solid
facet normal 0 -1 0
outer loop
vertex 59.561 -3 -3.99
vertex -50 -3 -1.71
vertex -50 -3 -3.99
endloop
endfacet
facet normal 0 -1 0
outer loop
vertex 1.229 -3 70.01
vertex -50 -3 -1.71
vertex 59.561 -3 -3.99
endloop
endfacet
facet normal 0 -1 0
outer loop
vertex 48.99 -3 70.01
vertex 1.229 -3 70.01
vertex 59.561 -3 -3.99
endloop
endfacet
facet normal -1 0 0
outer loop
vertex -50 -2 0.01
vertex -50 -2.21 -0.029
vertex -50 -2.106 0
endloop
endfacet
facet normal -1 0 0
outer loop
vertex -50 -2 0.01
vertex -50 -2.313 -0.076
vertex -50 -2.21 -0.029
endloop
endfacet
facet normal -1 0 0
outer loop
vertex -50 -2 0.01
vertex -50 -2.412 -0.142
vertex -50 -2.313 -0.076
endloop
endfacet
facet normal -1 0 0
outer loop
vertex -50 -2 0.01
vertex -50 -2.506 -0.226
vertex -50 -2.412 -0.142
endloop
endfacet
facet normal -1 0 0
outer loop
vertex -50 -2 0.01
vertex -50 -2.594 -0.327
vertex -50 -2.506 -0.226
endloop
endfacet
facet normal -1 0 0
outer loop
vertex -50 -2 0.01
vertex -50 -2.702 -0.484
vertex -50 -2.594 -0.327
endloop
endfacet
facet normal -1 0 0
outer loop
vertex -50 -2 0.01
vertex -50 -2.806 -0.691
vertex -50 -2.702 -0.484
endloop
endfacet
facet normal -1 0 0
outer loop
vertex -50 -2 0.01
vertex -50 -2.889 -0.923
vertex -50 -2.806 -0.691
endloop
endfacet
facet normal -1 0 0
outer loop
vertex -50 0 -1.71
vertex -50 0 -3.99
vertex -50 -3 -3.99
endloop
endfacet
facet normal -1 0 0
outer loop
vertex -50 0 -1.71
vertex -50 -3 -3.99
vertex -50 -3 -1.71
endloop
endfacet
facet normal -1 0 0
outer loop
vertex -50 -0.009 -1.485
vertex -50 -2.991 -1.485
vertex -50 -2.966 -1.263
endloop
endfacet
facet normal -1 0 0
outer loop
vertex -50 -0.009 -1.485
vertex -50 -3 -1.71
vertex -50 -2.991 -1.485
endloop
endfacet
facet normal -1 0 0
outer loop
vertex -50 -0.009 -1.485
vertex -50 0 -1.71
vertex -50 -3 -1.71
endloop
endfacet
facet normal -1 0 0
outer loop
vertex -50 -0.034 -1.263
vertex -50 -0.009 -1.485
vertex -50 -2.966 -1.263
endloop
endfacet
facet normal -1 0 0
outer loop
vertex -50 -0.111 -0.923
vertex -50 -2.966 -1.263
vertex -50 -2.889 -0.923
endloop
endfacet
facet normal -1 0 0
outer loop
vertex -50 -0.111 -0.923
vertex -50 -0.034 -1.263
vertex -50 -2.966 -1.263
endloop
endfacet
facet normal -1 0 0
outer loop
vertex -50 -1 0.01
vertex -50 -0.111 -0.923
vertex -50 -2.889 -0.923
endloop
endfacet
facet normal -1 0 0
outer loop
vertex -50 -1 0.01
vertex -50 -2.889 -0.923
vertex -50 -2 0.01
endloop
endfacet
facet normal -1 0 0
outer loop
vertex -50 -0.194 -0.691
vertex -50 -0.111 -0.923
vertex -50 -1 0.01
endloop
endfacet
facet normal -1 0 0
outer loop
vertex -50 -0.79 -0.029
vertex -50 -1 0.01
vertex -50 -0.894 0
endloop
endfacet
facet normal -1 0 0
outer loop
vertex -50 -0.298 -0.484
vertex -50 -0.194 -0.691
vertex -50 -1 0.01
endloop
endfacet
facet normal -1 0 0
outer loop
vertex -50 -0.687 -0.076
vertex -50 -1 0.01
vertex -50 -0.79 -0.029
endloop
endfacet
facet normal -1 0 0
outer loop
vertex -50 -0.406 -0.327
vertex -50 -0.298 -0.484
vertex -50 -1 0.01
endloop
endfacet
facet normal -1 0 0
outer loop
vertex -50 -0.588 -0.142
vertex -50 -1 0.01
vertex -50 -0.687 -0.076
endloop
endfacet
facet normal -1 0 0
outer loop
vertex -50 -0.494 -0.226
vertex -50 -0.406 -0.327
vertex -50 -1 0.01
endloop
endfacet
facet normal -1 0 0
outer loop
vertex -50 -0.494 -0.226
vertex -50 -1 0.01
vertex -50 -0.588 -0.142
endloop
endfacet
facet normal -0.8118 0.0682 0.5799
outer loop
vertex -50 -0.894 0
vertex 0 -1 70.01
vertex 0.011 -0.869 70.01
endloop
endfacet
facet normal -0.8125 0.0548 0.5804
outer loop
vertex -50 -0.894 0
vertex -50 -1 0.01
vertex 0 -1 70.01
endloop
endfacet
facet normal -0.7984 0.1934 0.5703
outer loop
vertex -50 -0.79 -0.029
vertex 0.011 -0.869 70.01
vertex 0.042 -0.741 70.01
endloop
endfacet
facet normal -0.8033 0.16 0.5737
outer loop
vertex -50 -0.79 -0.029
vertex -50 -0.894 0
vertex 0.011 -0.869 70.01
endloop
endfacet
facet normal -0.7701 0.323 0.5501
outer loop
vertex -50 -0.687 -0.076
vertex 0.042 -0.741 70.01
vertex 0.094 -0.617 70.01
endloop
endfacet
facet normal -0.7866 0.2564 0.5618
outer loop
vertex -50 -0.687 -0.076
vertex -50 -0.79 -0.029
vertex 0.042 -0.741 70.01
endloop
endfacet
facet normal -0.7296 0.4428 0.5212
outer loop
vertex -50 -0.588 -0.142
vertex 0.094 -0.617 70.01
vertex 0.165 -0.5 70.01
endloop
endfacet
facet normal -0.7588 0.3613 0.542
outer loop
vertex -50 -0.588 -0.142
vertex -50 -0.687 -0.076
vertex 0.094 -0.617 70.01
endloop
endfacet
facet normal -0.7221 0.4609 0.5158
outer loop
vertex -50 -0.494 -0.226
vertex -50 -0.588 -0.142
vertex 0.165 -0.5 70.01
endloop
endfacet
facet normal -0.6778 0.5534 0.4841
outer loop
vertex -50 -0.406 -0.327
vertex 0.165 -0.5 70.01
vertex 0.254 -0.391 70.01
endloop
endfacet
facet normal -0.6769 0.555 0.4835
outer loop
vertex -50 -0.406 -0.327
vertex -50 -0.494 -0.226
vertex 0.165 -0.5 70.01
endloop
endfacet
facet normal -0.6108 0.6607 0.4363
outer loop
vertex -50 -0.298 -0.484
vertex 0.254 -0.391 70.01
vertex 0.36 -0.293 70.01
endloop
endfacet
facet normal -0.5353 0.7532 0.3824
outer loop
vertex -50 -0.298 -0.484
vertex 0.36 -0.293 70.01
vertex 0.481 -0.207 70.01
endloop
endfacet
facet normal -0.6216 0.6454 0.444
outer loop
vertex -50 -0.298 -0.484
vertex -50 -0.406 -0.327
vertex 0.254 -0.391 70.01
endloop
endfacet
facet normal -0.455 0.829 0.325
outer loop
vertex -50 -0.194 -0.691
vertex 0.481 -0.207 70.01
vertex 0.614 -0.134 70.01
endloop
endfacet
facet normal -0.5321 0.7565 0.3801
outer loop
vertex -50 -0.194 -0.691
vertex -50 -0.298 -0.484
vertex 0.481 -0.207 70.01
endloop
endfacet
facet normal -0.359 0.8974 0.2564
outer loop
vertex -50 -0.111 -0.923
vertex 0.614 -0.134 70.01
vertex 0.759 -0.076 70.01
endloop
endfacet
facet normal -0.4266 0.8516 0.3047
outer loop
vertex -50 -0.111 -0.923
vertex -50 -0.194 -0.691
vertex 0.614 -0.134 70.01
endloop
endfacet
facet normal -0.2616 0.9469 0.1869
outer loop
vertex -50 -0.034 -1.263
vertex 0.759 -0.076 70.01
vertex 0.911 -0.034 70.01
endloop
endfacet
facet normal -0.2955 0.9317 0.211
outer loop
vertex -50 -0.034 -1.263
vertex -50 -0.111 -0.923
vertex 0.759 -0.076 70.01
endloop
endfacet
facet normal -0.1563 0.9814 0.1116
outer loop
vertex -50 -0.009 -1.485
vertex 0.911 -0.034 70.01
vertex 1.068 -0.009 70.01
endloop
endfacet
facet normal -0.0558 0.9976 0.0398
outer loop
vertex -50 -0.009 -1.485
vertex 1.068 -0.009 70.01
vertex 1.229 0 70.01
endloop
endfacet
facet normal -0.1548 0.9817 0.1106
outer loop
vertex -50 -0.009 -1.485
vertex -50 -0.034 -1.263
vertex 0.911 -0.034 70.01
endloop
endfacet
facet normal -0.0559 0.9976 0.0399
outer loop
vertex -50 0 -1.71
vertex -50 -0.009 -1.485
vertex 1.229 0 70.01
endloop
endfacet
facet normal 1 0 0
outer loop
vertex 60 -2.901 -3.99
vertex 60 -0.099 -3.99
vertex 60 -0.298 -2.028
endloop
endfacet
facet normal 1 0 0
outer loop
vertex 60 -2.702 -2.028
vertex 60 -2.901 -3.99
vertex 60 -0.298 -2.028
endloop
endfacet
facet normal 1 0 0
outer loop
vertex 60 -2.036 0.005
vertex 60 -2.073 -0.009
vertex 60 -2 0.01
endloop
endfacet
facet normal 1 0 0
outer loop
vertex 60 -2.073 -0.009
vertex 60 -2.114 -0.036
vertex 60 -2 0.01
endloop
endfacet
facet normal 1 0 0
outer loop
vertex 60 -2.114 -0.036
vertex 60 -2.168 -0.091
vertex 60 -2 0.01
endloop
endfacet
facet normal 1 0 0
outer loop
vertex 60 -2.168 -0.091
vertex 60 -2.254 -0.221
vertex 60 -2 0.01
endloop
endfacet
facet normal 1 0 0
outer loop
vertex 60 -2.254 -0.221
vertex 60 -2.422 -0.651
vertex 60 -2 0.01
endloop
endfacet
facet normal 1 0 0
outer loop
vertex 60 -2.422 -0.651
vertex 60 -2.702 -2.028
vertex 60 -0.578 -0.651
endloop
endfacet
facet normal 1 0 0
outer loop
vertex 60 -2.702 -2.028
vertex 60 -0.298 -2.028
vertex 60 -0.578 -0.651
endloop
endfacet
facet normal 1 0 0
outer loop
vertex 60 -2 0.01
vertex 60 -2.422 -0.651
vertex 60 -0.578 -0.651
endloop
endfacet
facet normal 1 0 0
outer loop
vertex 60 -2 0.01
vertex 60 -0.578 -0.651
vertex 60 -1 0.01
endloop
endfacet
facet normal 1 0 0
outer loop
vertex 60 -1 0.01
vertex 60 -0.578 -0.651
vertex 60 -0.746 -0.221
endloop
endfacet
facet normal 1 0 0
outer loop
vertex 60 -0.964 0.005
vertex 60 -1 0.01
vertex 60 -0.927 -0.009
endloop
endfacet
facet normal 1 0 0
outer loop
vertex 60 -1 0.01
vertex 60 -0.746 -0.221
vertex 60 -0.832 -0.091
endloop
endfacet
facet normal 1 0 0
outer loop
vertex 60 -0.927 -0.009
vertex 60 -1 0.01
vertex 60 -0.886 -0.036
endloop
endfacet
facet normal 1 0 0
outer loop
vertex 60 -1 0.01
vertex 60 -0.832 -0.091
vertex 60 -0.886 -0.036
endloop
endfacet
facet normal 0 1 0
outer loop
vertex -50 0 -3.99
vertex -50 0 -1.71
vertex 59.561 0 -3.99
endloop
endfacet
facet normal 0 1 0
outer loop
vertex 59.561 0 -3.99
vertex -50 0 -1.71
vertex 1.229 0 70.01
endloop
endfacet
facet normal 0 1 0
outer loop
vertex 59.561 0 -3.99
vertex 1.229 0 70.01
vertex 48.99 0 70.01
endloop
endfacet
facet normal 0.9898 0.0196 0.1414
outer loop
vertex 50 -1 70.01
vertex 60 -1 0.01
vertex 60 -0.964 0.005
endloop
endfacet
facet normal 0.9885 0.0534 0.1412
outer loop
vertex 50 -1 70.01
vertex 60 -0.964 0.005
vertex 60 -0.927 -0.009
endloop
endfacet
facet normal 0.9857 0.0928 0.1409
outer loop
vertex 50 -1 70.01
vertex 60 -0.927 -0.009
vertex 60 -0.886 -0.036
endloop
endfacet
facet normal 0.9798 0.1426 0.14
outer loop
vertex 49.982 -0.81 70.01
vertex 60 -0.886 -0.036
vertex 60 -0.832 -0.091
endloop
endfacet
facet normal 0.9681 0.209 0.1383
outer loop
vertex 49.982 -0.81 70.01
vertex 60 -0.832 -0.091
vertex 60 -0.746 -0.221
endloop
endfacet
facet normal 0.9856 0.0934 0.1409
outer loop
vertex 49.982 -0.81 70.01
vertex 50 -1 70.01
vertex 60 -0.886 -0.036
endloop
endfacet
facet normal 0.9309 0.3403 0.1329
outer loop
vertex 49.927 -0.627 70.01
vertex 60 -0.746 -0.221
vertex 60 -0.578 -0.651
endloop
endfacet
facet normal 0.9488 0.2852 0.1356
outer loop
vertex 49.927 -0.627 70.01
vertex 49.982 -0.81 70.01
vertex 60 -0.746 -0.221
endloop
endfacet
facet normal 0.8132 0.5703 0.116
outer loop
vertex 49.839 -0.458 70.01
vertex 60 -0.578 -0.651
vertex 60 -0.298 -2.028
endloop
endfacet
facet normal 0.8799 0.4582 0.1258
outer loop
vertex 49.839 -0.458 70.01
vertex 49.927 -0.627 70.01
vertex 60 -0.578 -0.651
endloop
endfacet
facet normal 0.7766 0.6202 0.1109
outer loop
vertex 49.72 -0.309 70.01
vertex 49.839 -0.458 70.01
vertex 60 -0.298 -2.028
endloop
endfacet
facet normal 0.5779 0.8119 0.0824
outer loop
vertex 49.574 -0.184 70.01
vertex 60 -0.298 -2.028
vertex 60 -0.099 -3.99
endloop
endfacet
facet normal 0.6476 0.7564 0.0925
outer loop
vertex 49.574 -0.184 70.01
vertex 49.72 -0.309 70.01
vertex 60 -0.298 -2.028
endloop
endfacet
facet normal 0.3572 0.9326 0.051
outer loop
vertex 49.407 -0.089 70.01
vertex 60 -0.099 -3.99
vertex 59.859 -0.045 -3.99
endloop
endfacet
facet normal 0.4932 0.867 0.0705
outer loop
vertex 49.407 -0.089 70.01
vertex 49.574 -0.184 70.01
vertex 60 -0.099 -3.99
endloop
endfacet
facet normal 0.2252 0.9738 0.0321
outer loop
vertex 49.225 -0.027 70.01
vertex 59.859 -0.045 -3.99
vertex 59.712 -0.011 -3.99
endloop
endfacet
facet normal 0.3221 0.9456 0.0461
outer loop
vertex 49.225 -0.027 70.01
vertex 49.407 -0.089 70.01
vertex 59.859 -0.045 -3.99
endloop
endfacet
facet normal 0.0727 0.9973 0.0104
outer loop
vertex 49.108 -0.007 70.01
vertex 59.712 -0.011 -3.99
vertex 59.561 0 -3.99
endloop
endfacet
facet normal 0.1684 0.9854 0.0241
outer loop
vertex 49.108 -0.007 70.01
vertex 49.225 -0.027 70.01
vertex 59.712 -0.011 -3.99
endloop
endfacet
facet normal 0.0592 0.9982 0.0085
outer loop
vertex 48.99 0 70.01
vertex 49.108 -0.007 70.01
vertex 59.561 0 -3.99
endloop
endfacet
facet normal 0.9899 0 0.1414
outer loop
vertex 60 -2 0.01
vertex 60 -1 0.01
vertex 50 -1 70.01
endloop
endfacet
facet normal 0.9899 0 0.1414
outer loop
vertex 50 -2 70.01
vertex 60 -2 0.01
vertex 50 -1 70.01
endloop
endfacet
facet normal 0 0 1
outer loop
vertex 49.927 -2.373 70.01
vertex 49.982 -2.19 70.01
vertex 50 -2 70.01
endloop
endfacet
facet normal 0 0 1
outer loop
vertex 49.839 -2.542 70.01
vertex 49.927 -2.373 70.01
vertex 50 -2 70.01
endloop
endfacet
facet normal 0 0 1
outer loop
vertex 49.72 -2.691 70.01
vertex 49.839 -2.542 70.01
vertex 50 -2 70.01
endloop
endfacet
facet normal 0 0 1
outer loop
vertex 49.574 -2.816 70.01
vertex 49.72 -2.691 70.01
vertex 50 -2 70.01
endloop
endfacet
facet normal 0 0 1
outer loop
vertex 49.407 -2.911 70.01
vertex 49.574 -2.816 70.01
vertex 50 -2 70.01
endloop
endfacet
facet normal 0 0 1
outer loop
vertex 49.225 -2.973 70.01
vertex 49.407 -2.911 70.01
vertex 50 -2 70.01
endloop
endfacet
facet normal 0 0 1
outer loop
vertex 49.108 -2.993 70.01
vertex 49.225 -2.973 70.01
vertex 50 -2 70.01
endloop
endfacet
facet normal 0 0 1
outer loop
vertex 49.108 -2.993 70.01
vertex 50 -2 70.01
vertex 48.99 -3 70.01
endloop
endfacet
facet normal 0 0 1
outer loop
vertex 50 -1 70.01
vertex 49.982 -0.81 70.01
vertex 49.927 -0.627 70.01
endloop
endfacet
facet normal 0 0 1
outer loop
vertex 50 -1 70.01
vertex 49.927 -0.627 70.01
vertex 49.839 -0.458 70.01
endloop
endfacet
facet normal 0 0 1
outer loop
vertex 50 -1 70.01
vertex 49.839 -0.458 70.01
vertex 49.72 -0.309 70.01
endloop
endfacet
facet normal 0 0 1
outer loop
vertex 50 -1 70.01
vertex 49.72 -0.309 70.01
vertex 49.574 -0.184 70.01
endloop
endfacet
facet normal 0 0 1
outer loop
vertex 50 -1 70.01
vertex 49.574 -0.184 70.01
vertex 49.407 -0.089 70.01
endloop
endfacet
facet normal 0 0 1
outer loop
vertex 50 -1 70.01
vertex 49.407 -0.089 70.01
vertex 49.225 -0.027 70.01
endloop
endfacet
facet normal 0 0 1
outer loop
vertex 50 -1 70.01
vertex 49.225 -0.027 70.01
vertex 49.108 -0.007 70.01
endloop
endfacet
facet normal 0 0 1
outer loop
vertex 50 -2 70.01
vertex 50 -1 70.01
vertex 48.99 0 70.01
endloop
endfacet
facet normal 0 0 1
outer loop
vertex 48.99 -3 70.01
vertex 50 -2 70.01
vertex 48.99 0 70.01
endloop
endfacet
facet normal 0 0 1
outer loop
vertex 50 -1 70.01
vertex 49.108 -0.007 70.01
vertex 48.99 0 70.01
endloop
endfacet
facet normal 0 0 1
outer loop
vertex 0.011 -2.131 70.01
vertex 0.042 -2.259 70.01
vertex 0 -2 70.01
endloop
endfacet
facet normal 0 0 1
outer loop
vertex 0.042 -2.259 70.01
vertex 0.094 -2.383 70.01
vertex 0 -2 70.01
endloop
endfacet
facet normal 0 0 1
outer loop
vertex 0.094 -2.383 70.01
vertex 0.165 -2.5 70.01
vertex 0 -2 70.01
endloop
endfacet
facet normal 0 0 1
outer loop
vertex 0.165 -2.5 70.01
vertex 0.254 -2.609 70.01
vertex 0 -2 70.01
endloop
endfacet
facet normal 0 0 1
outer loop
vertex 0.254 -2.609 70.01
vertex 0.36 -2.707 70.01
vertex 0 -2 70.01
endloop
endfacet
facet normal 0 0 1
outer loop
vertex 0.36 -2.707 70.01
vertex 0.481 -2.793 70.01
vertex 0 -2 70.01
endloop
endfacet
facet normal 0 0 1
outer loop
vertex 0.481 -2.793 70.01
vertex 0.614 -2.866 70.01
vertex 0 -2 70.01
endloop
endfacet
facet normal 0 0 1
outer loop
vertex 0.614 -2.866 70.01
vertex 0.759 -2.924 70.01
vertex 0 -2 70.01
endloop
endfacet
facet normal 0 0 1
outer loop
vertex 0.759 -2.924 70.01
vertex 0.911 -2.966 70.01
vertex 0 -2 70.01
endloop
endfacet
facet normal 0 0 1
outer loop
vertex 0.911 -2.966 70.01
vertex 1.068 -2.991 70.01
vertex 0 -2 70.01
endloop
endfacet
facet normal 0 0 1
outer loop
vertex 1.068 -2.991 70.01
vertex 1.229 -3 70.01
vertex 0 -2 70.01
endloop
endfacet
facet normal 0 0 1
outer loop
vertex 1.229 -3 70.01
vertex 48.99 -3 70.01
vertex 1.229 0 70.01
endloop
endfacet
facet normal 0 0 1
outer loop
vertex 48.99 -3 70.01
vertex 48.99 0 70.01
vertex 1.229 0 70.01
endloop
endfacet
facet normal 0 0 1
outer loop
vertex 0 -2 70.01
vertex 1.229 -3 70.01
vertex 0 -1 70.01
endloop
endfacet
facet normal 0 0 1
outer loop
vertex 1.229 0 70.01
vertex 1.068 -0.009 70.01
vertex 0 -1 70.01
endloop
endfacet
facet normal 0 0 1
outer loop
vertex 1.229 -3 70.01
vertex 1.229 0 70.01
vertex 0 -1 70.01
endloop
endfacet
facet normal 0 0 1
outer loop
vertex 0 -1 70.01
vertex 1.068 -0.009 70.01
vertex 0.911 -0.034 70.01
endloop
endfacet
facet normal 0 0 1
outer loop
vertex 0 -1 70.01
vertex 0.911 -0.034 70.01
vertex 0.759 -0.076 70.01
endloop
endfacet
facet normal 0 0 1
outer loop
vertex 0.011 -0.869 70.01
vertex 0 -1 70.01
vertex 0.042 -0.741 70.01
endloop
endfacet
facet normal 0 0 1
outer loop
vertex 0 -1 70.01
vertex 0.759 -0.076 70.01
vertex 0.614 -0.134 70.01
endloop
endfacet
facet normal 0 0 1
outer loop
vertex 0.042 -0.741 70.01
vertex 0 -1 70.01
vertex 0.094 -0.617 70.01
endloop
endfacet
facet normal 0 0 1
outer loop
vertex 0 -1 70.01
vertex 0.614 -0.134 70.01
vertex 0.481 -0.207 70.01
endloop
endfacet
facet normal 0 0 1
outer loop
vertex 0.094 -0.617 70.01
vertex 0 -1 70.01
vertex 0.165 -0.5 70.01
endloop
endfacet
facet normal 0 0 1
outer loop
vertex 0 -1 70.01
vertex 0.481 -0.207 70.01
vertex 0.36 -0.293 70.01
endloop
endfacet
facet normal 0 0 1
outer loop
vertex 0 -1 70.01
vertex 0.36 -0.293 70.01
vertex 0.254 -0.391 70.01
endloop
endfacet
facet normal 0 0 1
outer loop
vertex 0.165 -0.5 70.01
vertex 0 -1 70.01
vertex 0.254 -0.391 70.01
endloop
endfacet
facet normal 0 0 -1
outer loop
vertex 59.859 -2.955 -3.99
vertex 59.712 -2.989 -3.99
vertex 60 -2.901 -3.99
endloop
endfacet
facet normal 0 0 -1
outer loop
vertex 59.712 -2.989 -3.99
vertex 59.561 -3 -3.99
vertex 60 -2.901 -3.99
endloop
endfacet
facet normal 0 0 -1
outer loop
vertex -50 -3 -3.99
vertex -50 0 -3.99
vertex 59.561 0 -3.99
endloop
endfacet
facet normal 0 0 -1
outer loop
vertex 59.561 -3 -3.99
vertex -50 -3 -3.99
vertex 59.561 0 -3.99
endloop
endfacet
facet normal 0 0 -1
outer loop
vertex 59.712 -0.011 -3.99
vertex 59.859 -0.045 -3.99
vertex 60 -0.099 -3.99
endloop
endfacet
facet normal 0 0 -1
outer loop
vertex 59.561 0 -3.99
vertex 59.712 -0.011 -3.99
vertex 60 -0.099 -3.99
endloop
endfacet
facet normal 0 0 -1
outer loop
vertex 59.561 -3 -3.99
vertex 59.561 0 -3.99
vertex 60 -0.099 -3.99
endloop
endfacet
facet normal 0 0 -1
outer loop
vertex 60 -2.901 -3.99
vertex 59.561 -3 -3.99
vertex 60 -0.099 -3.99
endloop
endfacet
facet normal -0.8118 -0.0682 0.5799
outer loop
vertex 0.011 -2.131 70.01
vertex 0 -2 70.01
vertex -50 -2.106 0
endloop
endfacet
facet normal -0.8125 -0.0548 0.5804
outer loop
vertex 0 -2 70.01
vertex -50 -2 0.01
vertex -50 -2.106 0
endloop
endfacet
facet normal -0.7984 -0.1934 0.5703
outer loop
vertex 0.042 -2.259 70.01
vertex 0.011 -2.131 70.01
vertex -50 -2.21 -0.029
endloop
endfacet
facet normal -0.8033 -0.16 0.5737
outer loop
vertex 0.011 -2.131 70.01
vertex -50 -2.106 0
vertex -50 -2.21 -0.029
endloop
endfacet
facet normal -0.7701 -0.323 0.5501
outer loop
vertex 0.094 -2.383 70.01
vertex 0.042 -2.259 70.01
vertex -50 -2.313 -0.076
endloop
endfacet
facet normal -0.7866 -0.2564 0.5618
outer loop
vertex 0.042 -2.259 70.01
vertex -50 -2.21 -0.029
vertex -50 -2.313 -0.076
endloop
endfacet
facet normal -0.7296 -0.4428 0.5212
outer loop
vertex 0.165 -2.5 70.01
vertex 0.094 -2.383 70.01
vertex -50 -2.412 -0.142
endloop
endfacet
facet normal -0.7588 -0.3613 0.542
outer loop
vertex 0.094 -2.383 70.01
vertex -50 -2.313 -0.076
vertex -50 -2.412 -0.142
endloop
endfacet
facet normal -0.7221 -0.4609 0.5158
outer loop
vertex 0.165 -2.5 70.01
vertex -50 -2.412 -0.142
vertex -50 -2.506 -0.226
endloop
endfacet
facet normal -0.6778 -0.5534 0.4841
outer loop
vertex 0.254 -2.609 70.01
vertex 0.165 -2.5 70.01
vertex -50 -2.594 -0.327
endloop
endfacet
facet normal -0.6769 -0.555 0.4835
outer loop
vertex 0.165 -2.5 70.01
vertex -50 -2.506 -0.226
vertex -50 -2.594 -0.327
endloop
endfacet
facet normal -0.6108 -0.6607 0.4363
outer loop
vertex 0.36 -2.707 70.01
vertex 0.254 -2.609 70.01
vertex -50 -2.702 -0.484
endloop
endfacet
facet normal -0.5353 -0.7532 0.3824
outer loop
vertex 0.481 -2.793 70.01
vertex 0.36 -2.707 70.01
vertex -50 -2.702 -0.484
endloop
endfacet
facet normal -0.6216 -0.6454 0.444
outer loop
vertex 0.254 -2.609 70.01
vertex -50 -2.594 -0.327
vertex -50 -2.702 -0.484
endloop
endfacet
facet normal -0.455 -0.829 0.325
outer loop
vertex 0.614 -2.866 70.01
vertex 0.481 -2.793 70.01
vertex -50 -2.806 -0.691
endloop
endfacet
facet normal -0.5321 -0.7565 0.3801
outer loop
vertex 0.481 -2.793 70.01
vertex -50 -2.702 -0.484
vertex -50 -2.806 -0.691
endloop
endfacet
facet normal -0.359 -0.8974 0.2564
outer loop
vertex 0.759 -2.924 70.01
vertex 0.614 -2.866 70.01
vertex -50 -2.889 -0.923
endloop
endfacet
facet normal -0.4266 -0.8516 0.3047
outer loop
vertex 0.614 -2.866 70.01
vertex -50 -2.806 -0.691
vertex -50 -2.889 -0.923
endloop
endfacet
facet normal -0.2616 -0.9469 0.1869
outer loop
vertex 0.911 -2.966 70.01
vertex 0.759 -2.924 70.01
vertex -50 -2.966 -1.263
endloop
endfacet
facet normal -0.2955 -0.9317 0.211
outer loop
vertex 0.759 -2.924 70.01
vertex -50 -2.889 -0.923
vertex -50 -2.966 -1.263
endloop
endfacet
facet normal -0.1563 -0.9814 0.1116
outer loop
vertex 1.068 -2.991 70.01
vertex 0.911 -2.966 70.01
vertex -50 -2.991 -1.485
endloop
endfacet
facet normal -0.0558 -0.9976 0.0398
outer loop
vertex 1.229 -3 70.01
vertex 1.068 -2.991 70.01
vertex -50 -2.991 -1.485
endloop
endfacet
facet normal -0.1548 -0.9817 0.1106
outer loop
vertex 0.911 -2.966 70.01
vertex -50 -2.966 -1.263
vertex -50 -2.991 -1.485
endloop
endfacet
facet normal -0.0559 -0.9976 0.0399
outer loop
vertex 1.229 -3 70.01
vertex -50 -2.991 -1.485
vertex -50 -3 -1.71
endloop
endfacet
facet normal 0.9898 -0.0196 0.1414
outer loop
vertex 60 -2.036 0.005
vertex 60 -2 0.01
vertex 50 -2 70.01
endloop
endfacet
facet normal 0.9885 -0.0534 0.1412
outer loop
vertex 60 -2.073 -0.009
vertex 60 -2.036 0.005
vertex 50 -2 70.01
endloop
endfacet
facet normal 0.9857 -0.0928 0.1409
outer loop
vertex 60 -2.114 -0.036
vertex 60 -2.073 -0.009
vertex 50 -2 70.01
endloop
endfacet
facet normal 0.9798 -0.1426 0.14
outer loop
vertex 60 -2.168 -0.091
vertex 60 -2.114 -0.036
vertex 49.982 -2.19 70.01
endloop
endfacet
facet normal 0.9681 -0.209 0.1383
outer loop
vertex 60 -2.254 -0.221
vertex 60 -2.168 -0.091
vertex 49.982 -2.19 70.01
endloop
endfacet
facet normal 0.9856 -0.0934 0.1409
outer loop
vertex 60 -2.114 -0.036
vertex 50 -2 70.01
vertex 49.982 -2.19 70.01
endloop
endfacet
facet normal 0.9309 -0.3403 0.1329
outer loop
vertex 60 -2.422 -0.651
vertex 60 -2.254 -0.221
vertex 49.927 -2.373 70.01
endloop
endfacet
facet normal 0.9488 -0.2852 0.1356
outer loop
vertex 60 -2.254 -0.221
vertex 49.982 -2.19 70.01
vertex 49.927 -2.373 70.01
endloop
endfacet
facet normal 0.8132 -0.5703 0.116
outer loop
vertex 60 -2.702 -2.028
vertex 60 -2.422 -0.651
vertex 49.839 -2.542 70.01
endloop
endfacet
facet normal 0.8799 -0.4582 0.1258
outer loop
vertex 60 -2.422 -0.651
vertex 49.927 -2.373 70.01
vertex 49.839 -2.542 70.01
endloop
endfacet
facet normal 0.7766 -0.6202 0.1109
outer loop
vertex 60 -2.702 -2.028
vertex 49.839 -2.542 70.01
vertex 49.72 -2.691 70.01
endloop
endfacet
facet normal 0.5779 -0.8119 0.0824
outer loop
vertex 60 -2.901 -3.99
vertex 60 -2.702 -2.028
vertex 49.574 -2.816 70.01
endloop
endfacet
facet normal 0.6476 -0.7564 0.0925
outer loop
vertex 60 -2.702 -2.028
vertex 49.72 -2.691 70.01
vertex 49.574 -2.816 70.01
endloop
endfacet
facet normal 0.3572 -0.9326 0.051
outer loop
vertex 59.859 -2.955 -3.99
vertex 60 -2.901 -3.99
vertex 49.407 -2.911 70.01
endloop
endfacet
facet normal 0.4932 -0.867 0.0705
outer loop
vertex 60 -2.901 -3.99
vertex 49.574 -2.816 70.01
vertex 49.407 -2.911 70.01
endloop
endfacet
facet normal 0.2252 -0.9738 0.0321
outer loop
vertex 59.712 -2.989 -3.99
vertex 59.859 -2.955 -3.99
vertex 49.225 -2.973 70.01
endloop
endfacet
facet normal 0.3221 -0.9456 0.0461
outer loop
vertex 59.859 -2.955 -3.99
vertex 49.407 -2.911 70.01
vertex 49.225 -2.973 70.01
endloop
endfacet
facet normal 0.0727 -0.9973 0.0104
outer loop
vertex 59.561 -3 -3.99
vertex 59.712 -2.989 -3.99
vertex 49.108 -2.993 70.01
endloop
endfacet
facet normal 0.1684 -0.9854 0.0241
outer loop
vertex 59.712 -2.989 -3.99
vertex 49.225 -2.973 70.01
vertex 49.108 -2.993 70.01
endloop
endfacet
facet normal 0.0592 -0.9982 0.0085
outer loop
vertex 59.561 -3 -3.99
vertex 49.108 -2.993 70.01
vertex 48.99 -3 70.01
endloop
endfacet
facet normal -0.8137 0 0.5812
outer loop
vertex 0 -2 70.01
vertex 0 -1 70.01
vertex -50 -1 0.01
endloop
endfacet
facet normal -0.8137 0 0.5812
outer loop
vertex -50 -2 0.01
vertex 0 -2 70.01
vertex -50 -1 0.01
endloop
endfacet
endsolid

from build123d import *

# Parameters (mm, degrees)
F0_W     = 110
F0_H     = 4
F1_DEPTH = 3
F2_R     = 1


with BuildPart() as f1:
    # F0 (on Front) → F1 (new body)
    with BuildSketch(Plane.XZ):
        Polygon((0, 70.009968), (-50, 0.009968), (60, 0.009968), (50, 70.009968), align=None)
        with Locations((5, -1.990032)):
            Rectangle(F0_W, F0_H)
    extrude(amount=F1_DEPTH)

    # F2
    f2_edges = [f1.edges().sort_by_distance(p)[0] for p in [
        (-25, -3, 35.009968),
        (-25, 0, 35.009968),
        (55, -3, 35.009968),
        (55, 0, 35.009968),
    ]]
    fillet(f2_edges, radius=F2_R)


solid = f1.part
